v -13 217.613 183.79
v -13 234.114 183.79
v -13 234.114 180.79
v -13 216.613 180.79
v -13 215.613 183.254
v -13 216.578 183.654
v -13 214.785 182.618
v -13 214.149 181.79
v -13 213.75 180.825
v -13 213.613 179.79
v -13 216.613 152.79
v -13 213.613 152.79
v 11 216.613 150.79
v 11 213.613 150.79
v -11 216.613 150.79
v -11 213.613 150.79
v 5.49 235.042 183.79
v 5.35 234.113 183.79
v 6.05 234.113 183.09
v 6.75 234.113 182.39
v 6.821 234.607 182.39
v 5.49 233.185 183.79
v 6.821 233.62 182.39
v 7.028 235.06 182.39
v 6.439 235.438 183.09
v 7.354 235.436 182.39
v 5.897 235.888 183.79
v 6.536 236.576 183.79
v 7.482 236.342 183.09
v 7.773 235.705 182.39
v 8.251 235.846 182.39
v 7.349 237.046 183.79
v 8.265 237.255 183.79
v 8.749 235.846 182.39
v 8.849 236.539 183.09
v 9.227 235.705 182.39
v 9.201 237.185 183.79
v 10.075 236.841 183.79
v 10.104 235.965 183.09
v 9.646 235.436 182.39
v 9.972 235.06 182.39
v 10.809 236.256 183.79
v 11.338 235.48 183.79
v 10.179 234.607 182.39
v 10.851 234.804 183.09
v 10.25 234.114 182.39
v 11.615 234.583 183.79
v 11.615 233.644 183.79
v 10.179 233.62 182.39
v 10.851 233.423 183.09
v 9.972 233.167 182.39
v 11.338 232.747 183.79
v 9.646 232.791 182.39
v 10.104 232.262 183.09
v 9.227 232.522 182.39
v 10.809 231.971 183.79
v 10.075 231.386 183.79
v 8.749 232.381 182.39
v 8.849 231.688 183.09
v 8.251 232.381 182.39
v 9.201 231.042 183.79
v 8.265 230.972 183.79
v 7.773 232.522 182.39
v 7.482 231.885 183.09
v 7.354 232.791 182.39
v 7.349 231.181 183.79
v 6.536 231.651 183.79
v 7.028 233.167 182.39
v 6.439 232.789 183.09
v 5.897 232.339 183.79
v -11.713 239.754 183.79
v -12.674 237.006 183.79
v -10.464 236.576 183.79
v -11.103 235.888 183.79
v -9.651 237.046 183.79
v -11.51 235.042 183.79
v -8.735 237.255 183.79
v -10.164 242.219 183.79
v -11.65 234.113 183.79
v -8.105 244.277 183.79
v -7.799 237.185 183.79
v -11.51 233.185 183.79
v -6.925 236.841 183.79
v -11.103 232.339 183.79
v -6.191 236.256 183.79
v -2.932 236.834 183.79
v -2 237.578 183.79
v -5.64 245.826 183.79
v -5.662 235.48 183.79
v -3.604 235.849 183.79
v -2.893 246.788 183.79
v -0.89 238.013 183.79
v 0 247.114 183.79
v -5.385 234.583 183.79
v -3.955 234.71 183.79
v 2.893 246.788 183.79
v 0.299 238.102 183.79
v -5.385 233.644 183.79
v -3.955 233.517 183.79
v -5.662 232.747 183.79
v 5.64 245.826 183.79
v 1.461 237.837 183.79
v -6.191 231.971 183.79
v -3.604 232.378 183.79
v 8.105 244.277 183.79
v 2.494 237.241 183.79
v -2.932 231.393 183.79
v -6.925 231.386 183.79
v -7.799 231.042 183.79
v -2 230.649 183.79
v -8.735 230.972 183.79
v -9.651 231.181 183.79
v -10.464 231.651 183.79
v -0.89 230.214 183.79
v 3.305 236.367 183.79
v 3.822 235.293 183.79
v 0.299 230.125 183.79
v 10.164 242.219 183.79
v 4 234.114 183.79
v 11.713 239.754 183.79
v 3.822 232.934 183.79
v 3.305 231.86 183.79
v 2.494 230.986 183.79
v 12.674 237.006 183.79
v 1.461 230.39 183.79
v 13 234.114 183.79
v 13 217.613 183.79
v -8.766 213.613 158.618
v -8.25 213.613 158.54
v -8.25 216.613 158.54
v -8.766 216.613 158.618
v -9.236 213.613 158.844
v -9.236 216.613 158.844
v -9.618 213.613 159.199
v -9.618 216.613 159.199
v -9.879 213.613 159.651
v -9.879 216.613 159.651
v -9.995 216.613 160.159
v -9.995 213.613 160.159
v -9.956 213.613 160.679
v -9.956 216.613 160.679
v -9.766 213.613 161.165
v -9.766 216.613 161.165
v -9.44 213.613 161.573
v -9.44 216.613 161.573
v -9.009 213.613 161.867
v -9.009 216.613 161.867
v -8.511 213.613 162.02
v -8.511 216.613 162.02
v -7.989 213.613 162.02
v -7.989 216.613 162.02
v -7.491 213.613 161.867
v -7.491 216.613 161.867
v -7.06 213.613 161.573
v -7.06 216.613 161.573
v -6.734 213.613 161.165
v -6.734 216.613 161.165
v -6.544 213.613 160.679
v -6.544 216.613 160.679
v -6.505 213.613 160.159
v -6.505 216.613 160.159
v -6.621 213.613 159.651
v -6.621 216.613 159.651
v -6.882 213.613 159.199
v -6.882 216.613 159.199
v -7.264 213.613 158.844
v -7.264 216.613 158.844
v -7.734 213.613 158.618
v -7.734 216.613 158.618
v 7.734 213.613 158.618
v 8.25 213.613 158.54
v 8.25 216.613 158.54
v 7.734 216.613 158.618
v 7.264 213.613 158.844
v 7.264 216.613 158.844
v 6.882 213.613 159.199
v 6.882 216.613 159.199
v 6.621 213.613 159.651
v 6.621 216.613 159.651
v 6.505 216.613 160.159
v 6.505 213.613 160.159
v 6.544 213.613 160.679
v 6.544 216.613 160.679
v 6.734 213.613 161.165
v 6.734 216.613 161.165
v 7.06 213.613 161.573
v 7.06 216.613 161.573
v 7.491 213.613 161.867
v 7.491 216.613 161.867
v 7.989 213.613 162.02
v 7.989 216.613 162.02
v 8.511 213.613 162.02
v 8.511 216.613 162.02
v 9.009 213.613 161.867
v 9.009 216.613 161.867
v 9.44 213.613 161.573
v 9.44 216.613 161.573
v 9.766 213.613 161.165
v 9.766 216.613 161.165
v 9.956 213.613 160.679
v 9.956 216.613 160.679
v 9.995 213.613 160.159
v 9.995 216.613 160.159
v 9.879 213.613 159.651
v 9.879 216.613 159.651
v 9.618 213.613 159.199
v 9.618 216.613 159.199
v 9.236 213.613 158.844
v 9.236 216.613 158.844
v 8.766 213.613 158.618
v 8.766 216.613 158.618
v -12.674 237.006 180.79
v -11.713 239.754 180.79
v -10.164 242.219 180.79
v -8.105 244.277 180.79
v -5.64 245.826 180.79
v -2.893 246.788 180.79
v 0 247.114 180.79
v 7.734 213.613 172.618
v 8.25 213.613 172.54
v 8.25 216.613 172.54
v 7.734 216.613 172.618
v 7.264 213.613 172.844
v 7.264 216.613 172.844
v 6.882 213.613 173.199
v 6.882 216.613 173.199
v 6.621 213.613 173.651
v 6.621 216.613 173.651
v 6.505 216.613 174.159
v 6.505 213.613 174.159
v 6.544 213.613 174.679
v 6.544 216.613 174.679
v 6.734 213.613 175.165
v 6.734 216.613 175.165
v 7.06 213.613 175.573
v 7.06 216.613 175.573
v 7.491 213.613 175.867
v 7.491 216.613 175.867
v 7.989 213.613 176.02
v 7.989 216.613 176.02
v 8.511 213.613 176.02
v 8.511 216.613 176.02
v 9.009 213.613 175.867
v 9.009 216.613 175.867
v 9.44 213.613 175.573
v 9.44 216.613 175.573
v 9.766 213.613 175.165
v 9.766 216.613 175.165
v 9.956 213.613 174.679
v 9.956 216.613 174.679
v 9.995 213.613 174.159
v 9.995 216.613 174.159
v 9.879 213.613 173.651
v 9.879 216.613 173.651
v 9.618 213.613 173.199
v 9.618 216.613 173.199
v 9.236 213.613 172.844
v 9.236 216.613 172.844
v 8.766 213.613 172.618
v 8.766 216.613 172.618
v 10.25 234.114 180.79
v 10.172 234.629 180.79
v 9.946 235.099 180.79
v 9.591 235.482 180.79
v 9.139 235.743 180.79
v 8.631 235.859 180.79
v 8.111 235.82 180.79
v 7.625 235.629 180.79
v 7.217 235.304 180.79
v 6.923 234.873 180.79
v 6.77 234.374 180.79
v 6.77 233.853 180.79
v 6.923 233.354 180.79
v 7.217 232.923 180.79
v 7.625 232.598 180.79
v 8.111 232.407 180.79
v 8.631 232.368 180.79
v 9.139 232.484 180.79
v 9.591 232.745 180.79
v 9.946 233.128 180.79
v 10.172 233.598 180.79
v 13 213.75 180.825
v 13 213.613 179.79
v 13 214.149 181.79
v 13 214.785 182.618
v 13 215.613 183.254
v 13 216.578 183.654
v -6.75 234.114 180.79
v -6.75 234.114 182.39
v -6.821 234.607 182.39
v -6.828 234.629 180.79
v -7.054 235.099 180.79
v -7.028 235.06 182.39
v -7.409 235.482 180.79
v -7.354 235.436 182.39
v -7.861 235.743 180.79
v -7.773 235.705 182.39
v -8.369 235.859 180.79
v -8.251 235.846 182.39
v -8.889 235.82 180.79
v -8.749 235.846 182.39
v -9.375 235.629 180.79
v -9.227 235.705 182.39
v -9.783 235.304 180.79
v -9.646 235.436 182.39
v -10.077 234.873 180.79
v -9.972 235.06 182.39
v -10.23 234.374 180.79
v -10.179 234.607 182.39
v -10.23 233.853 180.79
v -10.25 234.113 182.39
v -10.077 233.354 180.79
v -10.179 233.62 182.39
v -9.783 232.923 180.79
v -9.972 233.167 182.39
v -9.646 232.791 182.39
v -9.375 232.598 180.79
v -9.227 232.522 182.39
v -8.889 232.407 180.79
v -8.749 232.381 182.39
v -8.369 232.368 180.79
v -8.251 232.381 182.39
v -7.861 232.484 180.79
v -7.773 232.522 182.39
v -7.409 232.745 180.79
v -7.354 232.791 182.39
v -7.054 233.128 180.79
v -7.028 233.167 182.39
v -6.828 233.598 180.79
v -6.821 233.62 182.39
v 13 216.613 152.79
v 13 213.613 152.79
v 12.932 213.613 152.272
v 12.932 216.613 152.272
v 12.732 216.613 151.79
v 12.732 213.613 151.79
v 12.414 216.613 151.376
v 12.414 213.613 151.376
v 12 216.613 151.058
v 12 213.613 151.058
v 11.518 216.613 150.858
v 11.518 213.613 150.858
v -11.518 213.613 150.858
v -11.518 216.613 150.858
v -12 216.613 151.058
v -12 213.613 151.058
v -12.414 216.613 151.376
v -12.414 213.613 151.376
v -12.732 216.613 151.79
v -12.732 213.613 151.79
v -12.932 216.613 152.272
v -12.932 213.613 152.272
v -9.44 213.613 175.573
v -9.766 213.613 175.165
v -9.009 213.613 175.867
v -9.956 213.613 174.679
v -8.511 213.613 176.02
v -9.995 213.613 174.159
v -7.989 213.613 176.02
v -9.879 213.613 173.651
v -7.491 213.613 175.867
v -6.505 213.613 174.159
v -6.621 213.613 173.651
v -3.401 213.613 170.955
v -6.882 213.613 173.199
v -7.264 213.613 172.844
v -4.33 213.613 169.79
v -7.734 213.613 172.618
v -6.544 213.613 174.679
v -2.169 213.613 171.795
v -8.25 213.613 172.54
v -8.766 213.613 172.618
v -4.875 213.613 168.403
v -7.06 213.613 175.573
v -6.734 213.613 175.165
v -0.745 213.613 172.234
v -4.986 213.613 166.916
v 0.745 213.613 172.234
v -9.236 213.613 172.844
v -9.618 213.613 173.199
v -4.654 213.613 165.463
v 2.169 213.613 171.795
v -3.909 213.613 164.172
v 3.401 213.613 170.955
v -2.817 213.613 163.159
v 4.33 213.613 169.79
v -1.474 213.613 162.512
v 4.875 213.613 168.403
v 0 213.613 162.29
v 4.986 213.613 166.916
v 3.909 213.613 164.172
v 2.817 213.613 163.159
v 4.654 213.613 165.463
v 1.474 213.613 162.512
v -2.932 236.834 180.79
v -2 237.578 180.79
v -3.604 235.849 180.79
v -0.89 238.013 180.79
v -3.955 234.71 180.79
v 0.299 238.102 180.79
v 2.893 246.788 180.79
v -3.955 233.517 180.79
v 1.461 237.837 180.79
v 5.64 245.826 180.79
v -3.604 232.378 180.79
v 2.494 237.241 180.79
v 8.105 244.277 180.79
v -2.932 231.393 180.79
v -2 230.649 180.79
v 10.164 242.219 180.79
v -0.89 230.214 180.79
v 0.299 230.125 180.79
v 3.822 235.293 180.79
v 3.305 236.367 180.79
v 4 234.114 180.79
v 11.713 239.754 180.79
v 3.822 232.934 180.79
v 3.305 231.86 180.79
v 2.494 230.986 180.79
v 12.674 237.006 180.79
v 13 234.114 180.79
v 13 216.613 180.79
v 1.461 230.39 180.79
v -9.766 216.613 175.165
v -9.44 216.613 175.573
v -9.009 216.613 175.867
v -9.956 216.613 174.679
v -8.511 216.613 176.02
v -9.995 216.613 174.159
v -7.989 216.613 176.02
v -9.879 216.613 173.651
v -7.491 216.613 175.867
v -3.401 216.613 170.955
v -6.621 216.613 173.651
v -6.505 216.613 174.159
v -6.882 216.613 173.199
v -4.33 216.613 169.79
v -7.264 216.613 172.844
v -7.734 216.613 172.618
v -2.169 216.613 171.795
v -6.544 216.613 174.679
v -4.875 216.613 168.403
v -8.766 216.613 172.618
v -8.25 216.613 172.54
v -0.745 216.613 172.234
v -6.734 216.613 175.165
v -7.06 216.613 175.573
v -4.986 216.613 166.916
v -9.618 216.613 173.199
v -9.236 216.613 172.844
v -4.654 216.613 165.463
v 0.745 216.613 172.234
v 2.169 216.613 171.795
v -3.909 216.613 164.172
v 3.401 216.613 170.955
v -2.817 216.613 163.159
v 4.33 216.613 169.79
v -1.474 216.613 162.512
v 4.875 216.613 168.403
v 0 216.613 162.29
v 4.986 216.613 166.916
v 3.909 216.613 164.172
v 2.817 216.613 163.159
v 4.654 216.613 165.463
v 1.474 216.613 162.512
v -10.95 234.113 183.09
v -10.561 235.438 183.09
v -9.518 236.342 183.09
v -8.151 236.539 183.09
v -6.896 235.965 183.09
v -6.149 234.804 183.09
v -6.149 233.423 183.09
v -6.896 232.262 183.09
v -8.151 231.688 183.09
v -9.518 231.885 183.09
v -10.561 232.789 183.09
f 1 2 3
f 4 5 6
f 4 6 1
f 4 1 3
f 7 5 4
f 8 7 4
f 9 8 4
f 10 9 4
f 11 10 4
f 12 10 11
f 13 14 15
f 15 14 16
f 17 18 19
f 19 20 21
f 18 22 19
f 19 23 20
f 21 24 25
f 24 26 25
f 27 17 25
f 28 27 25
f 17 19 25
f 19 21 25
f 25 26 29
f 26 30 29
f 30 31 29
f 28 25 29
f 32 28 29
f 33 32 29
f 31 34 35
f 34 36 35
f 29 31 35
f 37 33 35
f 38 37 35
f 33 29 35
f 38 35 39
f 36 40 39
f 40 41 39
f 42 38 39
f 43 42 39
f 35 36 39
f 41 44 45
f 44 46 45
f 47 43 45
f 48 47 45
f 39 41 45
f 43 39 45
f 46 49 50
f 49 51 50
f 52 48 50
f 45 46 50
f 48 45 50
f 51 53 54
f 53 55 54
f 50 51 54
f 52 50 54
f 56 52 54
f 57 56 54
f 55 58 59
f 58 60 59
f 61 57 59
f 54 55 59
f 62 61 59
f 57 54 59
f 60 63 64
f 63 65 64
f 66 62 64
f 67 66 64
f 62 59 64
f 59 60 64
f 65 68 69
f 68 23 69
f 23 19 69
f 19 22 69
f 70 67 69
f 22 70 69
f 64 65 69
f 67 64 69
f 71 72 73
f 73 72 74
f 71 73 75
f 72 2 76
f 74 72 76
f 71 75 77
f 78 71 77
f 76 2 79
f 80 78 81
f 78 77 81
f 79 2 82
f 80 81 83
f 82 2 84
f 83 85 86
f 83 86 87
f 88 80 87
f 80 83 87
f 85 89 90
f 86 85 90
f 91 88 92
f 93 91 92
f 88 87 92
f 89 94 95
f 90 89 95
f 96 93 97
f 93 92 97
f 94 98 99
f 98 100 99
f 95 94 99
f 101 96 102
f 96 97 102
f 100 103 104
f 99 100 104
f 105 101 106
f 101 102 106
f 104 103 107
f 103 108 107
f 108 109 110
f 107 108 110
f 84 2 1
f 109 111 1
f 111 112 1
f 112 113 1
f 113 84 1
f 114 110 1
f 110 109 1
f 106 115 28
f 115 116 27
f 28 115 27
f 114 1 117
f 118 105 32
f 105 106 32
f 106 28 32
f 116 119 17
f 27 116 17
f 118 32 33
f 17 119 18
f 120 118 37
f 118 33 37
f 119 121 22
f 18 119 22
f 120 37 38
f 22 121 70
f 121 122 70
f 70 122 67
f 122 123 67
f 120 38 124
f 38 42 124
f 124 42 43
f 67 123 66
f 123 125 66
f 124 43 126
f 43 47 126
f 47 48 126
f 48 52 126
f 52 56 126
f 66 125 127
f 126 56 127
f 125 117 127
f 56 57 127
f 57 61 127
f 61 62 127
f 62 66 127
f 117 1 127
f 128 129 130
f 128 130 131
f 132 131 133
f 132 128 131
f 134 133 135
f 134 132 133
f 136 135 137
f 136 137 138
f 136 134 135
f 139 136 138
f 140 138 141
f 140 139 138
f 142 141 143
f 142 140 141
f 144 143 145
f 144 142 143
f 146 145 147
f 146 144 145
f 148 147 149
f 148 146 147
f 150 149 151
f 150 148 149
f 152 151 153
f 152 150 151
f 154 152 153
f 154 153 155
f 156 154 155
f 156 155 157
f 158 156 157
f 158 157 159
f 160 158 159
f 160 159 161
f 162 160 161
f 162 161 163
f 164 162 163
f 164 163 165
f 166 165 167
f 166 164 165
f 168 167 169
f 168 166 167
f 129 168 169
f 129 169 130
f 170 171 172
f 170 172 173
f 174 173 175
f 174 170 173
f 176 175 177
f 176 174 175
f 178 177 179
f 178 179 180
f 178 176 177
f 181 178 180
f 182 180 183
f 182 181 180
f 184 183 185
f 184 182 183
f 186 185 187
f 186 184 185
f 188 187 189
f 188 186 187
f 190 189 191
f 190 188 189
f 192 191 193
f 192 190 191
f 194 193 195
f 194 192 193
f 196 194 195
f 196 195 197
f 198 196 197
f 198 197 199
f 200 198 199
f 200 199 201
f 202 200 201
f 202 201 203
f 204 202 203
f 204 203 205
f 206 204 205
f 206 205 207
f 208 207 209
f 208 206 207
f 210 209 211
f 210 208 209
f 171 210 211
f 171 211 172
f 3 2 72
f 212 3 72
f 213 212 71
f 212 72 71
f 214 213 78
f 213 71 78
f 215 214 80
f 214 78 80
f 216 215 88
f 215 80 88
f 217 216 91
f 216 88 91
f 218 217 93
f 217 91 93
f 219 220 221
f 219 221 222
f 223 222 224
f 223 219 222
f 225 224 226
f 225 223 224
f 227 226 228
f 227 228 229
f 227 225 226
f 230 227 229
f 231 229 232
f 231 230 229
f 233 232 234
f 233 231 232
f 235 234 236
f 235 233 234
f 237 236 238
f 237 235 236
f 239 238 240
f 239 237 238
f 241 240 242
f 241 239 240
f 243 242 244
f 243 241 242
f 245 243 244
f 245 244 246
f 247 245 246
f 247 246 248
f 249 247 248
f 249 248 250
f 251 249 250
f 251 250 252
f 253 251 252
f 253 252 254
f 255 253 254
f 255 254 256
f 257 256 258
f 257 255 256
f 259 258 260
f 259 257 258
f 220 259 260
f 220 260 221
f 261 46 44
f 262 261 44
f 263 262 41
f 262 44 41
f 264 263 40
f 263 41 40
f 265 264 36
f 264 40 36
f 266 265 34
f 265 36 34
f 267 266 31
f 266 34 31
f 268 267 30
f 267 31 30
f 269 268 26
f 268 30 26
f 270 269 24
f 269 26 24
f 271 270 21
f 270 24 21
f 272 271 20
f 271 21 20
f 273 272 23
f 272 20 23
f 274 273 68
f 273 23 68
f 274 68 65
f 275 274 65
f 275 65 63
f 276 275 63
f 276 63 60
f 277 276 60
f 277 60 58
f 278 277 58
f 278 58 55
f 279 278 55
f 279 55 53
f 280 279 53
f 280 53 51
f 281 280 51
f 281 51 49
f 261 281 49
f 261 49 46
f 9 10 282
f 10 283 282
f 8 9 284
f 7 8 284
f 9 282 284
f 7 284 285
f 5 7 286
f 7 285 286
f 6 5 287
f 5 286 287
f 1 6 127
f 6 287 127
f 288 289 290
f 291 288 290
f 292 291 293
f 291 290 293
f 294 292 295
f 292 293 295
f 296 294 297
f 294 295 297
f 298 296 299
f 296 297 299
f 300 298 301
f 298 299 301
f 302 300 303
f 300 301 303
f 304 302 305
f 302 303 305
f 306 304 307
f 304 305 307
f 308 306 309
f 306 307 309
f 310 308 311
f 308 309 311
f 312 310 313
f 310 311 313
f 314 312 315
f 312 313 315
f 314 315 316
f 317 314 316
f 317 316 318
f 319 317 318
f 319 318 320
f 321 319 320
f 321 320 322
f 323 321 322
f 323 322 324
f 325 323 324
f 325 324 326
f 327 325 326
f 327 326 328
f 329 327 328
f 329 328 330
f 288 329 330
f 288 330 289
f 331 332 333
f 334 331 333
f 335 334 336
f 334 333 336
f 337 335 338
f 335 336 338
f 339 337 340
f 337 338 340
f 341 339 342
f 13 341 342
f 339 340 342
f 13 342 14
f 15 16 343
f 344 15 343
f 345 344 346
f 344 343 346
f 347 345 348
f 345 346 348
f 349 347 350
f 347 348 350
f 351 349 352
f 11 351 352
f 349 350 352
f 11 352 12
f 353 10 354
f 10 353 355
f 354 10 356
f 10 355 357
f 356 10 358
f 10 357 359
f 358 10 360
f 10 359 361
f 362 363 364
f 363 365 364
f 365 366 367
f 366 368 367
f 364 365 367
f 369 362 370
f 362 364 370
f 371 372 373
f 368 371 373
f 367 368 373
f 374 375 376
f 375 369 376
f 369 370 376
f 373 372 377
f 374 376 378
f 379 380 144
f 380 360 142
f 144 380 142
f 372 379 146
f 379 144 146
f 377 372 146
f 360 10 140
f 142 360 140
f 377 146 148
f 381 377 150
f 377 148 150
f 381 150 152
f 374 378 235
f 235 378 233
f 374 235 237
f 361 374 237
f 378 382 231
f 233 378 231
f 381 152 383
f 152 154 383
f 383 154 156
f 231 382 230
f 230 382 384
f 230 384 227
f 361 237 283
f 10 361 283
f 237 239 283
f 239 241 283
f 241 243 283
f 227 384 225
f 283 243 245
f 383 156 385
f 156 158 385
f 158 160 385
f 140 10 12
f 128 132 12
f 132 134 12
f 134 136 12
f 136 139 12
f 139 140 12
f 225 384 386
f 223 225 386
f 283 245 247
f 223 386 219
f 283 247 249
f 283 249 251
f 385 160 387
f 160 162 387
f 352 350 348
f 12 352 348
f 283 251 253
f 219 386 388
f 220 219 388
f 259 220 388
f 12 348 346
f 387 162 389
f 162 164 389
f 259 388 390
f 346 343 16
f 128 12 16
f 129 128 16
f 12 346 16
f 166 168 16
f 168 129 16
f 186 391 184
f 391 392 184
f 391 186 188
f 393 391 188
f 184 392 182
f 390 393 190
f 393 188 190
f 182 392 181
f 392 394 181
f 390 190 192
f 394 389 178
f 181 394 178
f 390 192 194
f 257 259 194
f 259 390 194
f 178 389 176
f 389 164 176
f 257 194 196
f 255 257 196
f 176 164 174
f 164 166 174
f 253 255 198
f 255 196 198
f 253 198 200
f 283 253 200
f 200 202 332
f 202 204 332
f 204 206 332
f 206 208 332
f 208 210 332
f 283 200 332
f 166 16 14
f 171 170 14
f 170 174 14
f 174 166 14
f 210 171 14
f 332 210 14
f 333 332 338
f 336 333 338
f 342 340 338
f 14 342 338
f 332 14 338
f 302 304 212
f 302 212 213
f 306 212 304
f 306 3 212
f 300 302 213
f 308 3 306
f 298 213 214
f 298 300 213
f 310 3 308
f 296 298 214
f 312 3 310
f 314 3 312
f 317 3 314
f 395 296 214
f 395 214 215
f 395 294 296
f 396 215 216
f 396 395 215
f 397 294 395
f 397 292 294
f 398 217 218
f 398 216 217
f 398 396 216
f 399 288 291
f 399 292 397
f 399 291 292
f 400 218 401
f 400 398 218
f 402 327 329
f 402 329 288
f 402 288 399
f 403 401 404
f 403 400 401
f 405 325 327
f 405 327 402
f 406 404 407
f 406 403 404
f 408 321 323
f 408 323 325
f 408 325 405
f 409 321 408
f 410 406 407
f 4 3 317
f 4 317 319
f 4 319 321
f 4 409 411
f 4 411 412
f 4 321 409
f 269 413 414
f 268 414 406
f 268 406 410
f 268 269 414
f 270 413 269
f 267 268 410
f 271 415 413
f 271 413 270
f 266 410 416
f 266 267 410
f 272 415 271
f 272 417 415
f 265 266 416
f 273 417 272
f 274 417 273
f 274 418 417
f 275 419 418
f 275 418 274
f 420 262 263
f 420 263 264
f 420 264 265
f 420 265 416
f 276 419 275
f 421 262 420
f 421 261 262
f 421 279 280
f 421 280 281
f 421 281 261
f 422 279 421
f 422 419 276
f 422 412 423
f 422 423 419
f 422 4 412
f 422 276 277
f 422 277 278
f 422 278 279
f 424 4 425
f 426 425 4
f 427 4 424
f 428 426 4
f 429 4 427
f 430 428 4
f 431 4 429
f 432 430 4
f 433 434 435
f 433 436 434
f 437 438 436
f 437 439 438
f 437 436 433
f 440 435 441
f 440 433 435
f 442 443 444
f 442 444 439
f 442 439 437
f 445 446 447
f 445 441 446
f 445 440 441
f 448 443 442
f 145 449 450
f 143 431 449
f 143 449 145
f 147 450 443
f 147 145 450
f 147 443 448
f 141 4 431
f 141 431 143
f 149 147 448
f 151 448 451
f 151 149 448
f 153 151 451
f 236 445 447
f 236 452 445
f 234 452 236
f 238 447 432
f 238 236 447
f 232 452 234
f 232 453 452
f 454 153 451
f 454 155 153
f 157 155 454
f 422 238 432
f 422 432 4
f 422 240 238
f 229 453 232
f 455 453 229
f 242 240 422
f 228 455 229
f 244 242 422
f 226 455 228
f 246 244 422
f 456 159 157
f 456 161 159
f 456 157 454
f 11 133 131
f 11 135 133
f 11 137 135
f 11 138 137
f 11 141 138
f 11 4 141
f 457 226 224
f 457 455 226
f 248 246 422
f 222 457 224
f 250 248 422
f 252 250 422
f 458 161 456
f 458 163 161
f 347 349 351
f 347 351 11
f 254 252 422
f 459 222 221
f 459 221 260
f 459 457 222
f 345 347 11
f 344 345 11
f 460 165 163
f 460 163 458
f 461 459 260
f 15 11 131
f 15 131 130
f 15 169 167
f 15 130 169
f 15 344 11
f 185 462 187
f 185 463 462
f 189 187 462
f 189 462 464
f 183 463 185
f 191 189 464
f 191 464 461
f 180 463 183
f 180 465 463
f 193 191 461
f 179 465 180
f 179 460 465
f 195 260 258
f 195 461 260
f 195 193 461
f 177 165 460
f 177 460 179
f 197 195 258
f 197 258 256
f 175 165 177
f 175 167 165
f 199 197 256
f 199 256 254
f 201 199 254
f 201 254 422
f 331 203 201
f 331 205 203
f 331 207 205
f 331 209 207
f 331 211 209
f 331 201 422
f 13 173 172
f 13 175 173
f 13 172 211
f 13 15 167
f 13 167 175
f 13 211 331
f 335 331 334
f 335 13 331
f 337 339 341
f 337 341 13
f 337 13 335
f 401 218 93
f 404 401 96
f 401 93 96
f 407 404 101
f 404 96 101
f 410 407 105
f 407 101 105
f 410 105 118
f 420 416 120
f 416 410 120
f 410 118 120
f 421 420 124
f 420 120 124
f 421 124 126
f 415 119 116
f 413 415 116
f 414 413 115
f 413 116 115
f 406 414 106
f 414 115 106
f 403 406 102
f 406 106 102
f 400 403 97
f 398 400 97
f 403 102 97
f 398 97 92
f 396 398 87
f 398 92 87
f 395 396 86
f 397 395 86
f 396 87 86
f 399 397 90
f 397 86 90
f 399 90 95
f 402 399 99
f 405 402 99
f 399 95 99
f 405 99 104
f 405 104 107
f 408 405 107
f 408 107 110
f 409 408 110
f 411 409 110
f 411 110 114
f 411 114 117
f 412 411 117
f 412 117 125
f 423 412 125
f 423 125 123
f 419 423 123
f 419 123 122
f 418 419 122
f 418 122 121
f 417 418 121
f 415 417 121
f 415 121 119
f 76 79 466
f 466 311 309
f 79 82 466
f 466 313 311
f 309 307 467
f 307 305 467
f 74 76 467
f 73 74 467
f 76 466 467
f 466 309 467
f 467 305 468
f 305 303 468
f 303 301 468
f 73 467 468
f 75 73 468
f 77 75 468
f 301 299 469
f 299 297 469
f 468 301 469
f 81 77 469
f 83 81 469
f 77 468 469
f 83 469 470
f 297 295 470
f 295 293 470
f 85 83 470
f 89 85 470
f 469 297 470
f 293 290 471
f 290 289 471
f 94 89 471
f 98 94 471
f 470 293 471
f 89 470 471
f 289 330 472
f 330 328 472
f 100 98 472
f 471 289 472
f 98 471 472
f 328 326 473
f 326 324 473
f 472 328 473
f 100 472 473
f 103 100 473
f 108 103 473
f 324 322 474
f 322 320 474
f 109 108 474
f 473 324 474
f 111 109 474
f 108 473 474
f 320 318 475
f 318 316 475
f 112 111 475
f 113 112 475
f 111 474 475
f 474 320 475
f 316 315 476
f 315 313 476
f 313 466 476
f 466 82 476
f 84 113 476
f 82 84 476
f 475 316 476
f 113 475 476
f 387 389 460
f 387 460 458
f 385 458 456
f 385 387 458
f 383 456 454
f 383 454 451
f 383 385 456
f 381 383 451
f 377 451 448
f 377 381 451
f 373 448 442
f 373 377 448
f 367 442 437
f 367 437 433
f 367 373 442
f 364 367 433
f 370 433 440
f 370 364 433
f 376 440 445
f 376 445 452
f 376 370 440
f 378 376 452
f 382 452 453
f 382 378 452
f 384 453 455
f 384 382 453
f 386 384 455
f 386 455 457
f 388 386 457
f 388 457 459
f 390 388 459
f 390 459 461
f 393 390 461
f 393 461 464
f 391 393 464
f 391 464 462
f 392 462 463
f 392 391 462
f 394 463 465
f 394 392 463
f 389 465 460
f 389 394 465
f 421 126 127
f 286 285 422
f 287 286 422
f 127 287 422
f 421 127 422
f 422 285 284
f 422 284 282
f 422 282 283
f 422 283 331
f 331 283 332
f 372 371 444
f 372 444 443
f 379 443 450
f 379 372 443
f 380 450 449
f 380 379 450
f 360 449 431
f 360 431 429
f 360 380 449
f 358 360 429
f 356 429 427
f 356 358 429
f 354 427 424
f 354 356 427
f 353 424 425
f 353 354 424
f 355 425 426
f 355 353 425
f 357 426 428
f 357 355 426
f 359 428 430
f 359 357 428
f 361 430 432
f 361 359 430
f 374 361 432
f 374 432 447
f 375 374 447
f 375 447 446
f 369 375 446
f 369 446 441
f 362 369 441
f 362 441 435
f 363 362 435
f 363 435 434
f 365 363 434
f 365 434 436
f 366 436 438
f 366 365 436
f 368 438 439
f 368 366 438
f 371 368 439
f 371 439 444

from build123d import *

# Parameters (mm, degrees)
SKETCH_2_R                   = 44.45
SKETCH_2_R_2                 = 127
EXTRUDE_1_DEPTH              = 76.2
SKETCH_4_W                   = 660.4
SKETCH_4_H                   = 76.2
EXTRUDE_2_DEPTH              = 850.9
FILLET_2_R                   = 101.6
SKETCH_5_R                   = 44.45
SKETCH_5_R_2                 = 101.6
CUT_EXTRUDE_1_DEPTH          = 850.9
SCALE_1_SCALE                = 0.039370079
HOLE_WIZARD_M6_3_D           = 3.5
HOLE_WIZARD_M6_3_DEPTH       = 16.51
HOLE_WIZARD_M6_3_CSINK_D     = 6.3
HOLE_WIZARD_M6_3_CSINK_ANGLE = 90
HOLE_WIZARD_M6_3_TIP         = 1.051506083


with BuildPart() as part:
    # 草图2 → 凸台-拉伸1 (new body)
    with BuildSketch(Plane(origin=(0, 0, 0), x_dir=(1, 0, 0), z_dir=(0, 1, 0))):
        with BuildLine():
            Line((-330.2, 368.3), (-330.2, -342.9))
            Line((-330.2, -342.9), (330.2, -342.9))
            Line((330.2, -342.9), (330.2, 368.3))
            ThreePointArc((330.2, 368.3), (315.321024484, 404.221024484), (279.4, 419.1))
            Line((279.4, 419.1), (-279.4, 419.1))
            ThreePointArc((-279.4, 419.1), (-315.321024484, 404.221024484), (-330.2, 368.3))
        make_face()
        with Locations(Location((-209.55, -177.8, 0), (0, 0, 90))):
            Circle(SKETCH_2_R, mode=Mode.SUBTRACT)
        with Locations(Location((0, 0, 0), (0, 0, 90))):
            Circle(SKETCH_2_R_2, mode=Mode.SUBTRACT)
        with Locations(Location((209.55, -177.8, 0), (0, 0, 90))):
            Circle(SKETCH_2_R, mode=Mode.SUBTRACT)
        with Locations(Location((-209.55, 177.8, 0), (0, 0, 90))):
            Circle(SKETCH_2_R, mode=Mode.SUBTRACT)
        with Locations(Location((209.55, 177.8, 0), (0, 0, 90))):
            Circle(SKETCH_2_R, mode=Mode.SUBTRACT)
    extrude(amount=EXTRUDE_1_DEPTH)

    # 草图4 → 凸台-拉伸2 (add)
    with BuildSketch(Plane(origin=(0, 0, 0), x_dir=(1, 0, 0), z_dir=(0, 1, 0))):
        with Locations((0, -381)):
            Rectangle(SKETCH_4_W, SKETCH_4_H)
    extrude(amount=EXTRUDE_2_DEPTH)

    # 圆角2
    fillet_2_edges = [part.edges().sort_by_distance(p)[0] for p in [
        (0, 0, 419.1),
    ]]
    fillet(fillet_2_edges, radius=FILLET_2_R)

    # 草图5 → 切除-拉伸1 (cut)
    with BuildSketch(Plane.XY.offset(419.1)):
        with BuildLine():
            ThreePointArc((-330.2, 520.7), (-233.486660985, 754.186657311), (-5.196e-06, 850.9))
            Line((-5.196e-06, 850.9), (-330.2, 850.9))
            Line((-330.2, 850.9), (-330.2, 520.7))
        make_face()
        with BuildLine():
            Line((330.2, 520.7), (330.2, 850.9))
            Line((330.2, 850.9), (-5.196e-06, 850.9))
            ThreePointArc((-5.196e-06, 850.9), (233.486657311, 754.186660985), (330.2, 520.7))
        make_face()
        with Locations((215.9, 520.7)):
            Circle(SKETCH_5_R)
        with Locations((-215.9, 520.7)):
            Circle(SKETCH_5_R)
        with Locations((0, 520.7)):
            Circle(SKETCH_5_R_2)
    extrude(amount=-CUT_EXTRUDE_1_DEPTH, mode=Mode.SUBTRACT)


with BuildPart() as part_1:
    # 缩放比例1: scaled about (0, 222.368151505, 174.146040327)
    add(part.part.scale(SCALE_1_SCALE).moved(Location((0, 213.613499871, 167.289897007))))

    # M6 内六角花形半沉头螺钉的锥形沉头孔3
    with Locations(Plane.XY.offset(183.789897007)):
        with Locations((-8.5, 234.113499871), (8.5, 234.113499871)):
            CounterSinkHole(HOLE_WIZARD_M6_3_D / 2, HOLE_WIZARD_M6_3_CSINK_D / 2, depth=HOLE_WIZARD_M6_3_DEPTH, counter_sink_angle=HOLE_WIZARD_M6_3_CSINK_ANGLE)
            with Locations((0, 0, -(HOLE_WIZARD_M6_3_DEPTH + HOLE_WIZARD_M6_3_TIP / 2))):  # 118° drill point
                Cone(0, HOLE_WIZARD_M6_3_D / 2, HOLE_WIZARD_M6_3_TIP, mode=Mode.SUBTRACT)


solid = part_1.part
